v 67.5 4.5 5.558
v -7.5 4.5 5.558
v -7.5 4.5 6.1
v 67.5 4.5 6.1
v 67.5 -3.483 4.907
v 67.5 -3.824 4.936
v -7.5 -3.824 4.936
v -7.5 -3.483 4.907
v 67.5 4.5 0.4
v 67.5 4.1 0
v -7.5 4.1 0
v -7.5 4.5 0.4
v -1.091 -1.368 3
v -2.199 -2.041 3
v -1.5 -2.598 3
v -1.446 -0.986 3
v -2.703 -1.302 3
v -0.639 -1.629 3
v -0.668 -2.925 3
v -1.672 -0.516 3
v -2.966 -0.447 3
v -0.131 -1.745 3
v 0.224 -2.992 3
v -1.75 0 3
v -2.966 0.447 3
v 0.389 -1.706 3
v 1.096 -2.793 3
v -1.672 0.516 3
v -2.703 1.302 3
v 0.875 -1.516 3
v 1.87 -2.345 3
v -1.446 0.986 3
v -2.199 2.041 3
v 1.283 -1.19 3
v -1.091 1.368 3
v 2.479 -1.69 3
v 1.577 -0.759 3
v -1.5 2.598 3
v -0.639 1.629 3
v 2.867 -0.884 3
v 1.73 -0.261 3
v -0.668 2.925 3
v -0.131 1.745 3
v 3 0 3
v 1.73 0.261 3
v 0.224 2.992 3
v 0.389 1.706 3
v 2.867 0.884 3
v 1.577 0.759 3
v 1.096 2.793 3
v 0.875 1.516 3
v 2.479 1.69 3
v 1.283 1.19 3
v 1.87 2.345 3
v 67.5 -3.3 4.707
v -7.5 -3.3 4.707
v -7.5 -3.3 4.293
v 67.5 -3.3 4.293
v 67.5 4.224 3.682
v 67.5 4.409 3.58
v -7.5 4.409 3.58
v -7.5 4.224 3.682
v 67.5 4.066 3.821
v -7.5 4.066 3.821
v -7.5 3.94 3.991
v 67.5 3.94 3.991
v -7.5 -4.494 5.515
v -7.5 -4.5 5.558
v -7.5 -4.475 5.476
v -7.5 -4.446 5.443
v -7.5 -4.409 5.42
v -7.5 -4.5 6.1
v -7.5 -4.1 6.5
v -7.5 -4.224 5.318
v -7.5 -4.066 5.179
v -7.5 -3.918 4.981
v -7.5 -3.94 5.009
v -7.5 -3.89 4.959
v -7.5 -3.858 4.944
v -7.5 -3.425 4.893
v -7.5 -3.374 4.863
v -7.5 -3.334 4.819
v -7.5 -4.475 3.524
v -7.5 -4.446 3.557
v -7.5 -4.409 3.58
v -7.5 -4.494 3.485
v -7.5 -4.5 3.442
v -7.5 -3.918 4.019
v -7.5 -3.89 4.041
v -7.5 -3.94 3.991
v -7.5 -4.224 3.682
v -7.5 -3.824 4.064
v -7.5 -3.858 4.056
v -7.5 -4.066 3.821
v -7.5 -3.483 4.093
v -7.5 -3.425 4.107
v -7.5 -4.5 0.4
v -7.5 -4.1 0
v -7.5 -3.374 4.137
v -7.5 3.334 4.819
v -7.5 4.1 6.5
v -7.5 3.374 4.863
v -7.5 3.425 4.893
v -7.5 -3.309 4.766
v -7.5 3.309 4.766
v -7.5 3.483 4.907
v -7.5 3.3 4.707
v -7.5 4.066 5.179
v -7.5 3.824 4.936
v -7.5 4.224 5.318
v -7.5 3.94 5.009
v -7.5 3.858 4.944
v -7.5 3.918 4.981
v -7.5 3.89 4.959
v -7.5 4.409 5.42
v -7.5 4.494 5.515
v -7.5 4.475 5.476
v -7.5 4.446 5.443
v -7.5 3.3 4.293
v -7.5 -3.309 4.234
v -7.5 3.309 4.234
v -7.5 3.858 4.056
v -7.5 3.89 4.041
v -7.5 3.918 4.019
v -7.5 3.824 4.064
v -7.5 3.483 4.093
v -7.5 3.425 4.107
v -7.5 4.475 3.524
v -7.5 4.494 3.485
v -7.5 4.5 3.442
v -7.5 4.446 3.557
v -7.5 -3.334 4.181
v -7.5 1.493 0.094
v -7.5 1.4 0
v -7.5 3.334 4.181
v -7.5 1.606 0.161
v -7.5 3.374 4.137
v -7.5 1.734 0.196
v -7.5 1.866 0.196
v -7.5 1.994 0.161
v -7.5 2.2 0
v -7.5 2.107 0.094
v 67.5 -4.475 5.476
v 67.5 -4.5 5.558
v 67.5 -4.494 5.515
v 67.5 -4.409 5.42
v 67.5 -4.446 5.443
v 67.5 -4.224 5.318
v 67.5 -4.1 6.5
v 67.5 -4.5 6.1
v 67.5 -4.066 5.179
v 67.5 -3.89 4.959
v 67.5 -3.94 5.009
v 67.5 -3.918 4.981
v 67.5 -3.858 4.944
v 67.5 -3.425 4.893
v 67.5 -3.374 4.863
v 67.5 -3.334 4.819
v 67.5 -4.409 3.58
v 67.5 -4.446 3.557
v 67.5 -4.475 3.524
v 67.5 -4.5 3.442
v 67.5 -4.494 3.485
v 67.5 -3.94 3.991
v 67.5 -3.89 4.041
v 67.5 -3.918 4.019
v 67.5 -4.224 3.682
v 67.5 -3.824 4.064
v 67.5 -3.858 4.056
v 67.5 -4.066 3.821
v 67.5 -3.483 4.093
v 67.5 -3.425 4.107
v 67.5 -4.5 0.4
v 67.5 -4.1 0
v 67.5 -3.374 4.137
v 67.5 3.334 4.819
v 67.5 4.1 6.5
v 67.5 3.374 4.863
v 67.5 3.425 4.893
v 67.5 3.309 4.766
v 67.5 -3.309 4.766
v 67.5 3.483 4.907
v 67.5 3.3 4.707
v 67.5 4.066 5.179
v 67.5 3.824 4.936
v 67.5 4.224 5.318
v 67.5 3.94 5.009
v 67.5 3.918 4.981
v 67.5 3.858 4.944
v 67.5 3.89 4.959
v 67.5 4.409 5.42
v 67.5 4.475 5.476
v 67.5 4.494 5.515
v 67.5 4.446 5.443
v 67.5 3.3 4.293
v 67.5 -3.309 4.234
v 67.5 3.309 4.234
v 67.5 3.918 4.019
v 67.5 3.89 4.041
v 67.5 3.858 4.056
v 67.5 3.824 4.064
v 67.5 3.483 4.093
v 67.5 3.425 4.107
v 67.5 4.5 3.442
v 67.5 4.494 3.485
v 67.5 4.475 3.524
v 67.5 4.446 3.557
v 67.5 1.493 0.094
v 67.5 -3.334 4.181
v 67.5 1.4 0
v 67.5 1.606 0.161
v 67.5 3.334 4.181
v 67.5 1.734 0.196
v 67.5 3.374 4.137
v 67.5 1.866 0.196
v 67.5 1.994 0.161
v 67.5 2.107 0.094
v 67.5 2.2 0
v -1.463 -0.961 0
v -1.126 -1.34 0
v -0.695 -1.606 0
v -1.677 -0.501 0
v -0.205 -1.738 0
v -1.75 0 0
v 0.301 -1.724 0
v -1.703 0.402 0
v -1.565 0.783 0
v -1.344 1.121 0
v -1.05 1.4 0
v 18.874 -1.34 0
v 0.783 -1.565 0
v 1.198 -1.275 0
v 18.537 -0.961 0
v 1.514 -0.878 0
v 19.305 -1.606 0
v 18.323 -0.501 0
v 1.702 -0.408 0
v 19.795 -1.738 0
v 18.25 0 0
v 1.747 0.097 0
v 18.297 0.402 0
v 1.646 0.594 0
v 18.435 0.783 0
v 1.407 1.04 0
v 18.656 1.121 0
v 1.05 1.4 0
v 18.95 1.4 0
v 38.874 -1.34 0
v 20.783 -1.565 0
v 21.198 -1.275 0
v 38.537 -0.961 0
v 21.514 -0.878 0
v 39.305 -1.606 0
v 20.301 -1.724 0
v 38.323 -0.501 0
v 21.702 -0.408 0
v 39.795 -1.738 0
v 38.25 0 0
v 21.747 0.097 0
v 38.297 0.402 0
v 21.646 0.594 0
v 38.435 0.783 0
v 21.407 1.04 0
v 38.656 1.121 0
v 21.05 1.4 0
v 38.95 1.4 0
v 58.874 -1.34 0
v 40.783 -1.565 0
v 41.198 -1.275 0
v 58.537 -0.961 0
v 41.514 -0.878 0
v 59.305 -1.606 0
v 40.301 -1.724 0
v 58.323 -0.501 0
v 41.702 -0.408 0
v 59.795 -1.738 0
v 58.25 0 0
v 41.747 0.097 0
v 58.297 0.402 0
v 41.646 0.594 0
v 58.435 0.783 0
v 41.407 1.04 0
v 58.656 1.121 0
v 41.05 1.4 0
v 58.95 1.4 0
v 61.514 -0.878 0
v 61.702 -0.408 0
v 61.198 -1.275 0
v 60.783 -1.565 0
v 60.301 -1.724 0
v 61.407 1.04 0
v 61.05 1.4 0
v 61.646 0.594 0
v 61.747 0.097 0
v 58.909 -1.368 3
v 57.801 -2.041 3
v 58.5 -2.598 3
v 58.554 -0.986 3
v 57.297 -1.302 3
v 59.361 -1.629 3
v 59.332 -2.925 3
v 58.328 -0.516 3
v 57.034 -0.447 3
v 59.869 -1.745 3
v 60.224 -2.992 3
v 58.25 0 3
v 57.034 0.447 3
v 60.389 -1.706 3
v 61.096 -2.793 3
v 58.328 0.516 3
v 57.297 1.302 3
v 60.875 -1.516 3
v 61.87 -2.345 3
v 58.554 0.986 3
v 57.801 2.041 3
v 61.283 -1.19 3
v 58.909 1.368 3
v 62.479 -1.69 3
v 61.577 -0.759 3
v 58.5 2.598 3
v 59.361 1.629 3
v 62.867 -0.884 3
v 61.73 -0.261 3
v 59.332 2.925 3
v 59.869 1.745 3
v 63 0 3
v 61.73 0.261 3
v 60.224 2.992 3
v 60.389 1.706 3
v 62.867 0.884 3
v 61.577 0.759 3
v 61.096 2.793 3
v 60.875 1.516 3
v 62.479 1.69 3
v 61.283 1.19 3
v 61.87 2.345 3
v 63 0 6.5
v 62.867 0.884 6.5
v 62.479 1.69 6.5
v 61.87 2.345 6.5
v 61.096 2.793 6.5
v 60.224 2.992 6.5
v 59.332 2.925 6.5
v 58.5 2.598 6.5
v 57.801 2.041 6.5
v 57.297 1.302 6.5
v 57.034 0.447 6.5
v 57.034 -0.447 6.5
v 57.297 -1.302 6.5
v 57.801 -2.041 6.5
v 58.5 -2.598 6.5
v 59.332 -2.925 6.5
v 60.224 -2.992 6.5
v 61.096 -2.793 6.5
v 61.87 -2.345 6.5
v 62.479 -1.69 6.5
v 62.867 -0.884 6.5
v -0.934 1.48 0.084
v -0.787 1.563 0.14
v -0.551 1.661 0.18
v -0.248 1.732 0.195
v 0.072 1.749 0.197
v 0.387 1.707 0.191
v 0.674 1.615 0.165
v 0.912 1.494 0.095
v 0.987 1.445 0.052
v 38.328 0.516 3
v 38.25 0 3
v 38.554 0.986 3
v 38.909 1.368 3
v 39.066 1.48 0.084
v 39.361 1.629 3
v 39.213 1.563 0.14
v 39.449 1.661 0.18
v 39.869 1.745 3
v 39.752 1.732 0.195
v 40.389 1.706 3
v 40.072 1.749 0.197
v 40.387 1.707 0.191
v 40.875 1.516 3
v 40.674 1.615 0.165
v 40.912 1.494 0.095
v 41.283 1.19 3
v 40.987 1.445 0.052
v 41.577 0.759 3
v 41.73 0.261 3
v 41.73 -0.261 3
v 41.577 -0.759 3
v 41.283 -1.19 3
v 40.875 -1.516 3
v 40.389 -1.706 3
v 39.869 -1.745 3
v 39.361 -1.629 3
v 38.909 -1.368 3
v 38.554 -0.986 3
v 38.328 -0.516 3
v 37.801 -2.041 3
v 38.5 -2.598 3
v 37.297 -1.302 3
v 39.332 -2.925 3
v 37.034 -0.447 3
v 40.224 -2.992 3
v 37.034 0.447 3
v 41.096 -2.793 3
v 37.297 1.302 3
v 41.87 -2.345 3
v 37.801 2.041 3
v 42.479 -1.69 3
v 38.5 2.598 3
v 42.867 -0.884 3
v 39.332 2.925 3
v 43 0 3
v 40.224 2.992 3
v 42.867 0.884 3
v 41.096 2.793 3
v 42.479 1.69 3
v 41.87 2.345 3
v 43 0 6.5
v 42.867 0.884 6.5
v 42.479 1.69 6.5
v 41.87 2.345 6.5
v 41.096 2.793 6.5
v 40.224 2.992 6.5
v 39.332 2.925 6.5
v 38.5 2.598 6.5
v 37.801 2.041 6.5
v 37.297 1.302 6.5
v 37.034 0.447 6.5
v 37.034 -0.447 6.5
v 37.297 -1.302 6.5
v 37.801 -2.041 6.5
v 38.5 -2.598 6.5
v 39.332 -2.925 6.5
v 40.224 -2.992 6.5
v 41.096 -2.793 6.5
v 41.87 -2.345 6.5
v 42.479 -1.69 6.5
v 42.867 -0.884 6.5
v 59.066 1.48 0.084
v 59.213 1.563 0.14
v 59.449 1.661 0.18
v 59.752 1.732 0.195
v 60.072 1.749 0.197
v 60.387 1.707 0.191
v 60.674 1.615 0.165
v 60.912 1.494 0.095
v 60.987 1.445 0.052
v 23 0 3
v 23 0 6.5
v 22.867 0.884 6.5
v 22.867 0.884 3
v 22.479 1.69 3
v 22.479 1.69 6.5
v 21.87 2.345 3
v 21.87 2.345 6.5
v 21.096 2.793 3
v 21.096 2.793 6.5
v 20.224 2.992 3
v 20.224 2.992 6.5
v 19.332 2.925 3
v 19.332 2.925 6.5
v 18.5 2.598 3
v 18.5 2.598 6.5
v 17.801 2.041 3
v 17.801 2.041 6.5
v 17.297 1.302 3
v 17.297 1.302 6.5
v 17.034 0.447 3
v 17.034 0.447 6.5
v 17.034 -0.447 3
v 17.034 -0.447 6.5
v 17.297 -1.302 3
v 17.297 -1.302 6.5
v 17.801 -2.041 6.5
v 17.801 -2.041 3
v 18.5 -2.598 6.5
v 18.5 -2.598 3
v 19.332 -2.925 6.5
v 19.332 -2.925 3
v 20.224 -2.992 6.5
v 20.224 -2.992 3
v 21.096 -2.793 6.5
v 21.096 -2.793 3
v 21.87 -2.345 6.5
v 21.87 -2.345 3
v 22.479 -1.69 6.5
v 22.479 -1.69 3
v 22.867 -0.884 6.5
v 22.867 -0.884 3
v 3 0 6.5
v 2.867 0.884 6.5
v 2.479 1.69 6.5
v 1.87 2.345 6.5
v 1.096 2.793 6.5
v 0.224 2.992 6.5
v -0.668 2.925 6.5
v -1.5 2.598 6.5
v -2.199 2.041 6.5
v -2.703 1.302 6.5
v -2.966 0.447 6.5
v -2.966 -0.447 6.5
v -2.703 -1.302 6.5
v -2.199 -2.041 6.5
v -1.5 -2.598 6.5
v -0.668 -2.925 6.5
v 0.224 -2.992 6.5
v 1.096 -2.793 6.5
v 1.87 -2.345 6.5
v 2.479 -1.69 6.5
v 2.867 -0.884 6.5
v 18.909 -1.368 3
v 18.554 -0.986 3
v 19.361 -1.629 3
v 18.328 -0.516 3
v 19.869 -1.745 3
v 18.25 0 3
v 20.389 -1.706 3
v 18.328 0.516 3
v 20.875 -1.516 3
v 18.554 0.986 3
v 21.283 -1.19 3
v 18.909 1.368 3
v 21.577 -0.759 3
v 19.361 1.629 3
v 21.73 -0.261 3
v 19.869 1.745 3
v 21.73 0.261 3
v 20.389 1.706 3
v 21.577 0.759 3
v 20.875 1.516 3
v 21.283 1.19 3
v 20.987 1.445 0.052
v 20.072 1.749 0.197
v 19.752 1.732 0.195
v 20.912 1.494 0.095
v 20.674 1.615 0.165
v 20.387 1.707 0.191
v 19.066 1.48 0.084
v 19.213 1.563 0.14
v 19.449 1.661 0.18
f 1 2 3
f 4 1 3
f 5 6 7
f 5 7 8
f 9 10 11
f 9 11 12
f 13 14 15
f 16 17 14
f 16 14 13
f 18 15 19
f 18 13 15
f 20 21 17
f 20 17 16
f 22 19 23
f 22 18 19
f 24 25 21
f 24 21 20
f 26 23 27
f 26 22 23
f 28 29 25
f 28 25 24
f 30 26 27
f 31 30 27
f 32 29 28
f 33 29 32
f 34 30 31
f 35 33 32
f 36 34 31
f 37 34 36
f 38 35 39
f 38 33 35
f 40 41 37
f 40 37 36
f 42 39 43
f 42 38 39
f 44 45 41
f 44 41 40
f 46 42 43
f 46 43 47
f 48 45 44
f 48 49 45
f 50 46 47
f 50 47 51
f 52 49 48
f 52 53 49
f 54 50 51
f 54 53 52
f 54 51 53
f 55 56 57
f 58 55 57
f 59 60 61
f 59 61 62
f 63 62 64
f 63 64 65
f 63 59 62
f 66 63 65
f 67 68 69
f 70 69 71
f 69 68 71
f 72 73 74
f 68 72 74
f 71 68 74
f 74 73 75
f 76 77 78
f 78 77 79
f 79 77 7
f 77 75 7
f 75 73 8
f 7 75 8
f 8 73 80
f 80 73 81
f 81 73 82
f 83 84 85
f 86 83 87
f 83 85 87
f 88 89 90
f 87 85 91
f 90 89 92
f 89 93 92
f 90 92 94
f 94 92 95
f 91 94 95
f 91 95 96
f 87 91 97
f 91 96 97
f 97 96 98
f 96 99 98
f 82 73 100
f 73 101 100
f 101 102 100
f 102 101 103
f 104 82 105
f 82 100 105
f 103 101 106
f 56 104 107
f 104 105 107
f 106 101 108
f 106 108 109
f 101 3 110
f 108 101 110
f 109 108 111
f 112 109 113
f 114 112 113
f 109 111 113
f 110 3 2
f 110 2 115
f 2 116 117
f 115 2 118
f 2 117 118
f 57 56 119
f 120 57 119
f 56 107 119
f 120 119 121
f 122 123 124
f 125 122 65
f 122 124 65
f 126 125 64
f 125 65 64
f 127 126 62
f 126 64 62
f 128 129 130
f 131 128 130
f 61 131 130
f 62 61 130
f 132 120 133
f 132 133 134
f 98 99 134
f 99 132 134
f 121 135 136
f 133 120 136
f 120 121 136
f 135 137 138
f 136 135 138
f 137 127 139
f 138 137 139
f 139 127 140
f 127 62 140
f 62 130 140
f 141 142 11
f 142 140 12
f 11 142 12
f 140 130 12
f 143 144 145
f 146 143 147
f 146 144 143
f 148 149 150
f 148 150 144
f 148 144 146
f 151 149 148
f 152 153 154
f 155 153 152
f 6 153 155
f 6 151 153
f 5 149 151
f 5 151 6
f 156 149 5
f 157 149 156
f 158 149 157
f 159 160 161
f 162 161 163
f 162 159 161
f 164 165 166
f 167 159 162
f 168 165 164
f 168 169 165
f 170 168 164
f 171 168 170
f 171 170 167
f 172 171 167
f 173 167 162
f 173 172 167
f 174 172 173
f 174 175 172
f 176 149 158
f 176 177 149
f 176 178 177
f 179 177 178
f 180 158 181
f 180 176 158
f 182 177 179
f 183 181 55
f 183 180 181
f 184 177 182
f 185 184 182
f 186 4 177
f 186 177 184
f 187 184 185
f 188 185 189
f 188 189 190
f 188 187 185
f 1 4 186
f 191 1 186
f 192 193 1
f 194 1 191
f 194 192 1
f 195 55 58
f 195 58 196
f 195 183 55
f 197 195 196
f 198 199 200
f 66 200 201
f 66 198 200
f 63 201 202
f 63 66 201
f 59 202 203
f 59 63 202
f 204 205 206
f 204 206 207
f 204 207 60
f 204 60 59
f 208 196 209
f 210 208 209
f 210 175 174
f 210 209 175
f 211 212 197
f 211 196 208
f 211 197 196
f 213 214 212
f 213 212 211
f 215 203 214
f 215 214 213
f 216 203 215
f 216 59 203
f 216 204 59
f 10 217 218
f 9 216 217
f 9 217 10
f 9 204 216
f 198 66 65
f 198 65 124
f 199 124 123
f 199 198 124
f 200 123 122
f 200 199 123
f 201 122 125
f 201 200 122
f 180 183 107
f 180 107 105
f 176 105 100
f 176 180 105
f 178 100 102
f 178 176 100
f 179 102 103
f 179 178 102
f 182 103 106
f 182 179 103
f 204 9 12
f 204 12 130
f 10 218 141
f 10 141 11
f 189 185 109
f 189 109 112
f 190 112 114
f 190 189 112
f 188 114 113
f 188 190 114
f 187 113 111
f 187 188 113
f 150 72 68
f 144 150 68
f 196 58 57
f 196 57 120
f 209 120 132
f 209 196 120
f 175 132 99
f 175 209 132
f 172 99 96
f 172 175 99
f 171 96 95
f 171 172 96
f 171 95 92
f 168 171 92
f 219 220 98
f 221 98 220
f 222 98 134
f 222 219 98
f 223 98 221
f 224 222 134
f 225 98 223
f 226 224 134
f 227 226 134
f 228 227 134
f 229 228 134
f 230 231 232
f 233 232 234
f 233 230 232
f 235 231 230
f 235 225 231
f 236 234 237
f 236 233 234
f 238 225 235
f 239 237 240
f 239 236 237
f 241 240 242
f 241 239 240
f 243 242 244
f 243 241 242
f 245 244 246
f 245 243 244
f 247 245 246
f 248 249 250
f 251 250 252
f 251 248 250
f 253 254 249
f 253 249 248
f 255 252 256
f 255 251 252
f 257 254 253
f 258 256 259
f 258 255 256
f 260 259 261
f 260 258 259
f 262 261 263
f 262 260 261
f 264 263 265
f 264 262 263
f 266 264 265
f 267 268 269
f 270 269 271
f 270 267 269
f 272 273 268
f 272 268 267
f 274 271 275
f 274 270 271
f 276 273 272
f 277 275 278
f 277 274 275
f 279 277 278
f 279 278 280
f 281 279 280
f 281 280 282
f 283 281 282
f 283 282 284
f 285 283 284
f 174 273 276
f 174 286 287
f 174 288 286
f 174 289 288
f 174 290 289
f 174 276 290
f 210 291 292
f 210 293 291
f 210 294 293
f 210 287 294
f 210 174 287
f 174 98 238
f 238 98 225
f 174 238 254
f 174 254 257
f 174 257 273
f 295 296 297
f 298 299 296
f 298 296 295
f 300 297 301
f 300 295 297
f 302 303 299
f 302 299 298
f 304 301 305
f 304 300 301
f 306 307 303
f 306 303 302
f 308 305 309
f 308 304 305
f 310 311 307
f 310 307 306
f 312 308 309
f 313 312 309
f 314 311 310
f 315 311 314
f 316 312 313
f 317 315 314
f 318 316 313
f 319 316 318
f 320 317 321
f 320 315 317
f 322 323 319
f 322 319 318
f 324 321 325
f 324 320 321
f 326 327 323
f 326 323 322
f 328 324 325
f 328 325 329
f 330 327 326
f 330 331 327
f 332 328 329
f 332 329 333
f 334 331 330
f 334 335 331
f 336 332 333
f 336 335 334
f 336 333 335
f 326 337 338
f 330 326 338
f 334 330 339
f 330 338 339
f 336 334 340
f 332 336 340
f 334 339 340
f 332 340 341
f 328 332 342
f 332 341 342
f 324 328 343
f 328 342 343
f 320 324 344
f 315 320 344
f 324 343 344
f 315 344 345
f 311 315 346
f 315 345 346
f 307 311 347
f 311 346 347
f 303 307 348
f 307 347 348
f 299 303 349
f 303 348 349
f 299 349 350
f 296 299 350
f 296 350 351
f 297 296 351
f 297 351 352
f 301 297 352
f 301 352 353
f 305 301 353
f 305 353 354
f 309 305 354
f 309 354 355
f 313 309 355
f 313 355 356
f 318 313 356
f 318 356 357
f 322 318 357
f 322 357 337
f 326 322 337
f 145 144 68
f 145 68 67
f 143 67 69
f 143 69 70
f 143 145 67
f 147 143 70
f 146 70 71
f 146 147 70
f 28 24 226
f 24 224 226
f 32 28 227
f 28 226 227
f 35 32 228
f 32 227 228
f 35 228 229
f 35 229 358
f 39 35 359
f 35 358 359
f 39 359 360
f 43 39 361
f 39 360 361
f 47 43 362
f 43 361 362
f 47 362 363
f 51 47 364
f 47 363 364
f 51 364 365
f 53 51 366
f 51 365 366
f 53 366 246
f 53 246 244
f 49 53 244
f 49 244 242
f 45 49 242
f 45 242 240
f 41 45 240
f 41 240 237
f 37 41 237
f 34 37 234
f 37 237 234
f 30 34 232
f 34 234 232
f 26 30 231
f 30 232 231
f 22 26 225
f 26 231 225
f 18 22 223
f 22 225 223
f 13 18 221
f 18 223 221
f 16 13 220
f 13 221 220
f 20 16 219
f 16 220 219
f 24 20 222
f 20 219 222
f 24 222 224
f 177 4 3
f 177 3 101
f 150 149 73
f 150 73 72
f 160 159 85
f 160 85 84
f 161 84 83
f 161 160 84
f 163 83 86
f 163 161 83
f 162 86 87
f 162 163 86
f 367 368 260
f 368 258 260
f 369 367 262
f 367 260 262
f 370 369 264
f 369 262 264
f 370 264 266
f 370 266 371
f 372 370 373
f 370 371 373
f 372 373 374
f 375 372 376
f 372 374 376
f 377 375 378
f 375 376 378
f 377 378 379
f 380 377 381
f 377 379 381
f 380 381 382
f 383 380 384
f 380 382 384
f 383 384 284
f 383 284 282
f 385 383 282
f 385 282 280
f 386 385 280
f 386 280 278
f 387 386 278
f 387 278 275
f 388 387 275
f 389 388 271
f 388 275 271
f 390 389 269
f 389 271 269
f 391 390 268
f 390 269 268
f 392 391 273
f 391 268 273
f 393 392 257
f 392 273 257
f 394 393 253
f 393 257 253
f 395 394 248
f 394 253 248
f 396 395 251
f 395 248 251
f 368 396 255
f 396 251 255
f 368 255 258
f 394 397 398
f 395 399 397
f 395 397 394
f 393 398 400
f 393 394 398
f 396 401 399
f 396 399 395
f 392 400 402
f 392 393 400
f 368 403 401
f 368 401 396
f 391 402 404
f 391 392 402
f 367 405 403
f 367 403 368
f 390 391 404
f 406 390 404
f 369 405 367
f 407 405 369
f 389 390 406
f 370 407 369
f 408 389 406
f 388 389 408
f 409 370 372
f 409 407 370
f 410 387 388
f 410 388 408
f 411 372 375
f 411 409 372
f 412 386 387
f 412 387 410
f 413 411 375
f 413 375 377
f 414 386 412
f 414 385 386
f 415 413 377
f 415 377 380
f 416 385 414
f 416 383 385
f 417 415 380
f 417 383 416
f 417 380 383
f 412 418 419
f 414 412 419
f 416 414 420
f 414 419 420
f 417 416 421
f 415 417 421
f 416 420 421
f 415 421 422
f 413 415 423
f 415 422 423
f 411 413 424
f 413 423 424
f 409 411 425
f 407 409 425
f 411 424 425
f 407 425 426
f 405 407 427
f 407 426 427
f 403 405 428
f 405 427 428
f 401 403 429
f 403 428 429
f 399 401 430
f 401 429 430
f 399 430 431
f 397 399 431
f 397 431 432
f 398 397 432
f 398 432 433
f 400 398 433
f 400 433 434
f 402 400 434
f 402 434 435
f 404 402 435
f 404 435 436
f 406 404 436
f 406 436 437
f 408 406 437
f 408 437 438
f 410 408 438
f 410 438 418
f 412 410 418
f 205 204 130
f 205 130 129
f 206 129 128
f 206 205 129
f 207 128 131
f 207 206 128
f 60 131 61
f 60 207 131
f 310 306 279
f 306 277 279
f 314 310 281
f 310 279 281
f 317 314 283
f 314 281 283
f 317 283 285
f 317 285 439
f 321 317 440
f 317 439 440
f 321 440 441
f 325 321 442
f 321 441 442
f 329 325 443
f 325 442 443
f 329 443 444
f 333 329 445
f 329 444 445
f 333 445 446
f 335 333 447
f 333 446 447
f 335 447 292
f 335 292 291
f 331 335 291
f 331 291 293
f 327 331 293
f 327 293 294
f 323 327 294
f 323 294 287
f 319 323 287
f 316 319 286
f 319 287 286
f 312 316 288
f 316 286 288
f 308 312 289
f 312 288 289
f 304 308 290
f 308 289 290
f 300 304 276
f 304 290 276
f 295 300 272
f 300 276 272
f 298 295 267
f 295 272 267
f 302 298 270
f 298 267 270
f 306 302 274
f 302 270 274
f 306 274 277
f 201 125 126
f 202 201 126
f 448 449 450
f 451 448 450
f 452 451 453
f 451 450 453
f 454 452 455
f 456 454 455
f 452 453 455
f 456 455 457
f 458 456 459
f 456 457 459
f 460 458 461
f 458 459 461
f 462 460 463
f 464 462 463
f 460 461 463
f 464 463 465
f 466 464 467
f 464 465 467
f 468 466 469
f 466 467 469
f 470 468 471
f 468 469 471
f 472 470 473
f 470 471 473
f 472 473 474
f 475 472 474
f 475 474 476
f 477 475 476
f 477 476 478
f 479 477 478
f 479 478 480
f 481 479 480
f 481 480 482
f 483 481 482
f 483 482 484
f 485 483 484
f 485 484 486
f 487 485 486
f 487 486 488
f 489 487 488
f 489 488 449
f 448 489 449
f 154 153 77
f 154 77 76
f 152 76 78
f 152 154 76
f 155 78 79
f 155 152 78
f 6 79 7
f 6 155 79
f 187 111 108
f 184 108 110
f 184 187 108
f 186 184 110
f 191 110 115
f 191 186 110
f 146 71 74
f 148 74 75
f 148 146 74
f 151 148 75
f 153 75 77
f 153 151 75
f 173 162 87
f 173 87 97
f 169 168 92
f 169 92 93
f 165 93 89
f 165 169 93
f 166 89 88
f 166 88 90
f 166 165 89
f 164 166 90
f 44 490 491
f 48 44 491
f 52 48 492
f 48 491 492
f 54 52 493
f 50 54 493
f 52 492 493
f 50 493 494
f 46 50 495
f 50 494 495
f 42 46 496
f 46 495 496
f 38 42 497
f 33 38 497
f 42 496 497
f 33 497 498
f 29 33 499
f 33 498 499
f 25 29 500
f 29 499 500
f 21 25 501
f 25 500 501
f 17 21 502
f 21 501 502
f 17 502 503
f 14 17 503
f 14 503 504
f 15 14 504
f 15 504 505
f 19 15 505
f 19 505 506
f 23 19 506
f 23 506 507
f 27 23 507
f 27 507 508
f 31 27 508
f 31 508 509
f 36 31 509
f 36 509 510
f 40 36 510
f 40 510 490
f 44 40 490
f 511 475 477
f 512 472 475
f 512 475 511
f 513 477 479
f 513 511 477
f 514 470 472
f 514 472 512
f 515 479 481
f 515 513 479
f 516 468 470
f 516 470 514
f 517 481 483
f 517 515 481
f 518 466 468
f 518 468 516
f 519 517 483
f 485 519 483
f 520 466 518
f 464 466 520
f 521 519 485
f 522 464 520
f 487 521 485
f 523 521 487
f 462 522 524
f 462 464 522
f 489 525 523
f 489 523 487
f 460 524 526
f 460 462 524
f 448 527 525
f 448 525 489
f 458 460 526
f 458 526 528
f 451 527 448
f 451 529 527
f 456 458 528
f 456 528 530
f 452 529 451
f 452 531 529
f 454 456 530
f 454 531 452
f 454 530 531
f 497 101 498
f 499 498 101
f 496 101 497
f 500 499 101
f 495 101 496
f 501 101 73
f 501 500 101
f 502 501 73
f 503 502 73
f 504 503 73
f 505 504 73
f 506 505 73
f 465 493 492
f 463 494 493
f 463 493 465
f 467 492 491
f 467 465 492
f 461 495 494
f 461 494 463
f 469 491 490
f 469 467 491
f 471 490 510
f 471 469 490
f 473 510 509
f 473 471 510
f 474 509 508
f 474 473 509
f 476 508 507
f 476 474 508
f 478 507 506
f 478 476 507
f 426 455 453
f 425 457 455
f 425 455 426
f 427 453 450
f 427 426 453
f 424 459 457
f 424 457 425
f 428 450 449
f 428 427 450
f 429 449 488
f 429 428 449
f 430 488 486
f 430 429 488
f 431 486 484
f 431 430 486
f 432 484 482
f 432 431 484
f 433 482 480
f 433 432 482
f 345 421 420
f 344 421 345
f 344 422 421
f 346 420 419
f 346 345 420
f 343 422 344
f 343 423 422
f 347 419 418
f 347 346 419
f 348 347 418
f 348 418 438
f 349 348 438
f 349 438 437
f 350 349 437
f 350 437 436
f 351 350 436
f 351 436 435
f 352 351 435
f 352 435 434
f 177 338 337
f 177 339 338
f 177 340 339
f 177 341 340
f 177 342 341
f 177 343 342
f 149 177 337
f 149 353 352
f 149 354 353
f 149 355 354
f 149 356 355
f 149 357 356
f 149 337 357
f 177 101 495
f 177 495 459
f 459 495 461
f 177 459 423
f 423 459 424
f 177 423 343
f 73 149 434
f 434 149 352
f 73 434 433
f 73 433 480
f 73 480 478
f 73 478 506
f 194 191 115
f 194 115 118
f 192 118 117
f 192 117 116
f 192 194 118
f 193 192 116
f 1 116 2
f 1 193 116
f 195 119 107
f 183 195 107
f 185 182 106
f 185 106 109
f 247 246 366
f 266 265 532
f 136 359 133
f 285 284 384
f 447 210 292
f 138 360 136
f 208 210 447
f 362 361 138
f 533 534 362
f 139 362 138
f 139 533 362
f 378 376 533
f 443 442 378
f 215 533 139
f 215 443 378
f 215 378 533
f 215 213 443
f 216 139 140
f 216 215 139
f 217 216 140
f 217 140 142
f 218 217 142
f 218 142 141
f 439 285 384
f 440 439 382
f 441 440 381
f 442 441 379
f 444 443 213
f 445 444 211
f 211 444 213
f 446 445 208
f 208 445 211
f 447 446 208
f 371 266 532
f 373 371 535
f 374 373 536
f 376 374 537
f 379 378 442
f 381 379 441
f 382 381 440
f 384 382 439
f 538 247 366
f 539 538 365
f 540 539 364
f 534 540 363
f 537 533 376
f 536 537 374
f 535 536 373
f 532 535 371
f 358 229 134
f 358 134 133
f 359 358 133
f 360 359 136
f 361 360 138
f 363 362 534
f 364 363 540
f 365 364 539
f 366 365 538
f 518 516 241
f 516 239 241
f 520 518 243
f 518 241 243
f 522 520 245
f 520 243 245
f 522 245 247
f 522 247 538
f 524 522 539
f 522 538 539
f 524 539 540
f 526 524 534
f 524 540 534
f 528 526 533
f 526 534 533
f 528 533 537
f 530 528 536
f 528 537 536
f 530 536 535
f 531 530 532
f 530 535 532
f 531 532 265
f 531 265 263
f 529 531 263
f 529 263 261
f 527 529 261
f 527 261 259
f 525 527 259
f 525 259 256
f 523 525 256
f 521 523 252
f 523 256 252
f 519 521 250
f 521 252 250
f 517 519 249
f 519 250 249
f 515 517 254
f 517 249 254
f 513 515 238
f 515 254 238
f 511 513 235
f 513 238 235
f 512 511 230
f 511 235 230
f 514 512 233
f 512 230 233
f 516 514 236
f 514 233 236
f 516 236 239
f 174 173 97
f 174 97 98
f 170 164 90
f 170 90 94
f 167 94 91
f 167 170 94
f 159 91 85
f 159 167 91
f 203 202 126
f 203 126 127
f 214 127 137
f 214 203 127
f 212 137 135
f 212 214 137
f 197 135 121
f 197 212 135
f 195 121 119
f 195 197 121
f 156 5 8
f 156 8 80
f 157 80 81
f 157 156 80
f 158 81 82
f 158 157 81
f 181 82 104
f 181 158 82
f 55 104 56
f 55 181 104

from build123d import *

# Parameters (mm, degrees)
BOSS_EXTRUDE1_DEPTH                              = 75
CBORE_FOR_M3_HEX_HEAD_MACHINE_SCREW2_D           = 3.5
CBORE_FOR_M3_HEX_HEAD_MACHINE_SCREW2_DEPTH       = 6.5
CBORE_FOR_M3_HEX_HEAD_MACHINE_SCREW2_CBORE_D     = 6
CBORE_FOR_M3_HEX_HEAD_MACHINE_SCREW2_CBORE_DEPTH = 3.5
LPATTERN2_COUNT                                  = 4
LPATTERN2_PITCH                                  = 20


with BuildPart() as part:
    # Sketch1 → Boss-Extrude1 (new body)
    with BuildSketch(Plane(origin=(67.5, 0, 0), x_dir=(0, 0, -1), z_dir=(1, 0, 0))):
        with BuildLine():
            Line((-3.441696476, -4.5), (-0.4, -4.5))
            Line((-0.4, -4.5), (0, -4.1))
            Line((0, -4.1), (0, 1.4))
            ThreePointArc((0, 1.4), (-0.2, 1.8), (0, 2.2))
            Line((0, 2.2), (0, 4.1))
            Line((0, 4.1), (-0.4, 4.5))
            Line((-0.4, 4.5), (-3.441696476, 4.5))
            ThreePointArc((-3.441696476, 4.5), (-3.524448068, 4.475108648), (-3.579735674, 4.408695652))
            ThreePointArc((-3.579735674, 4.408695652), (-3.747623907, 4.141262777), (-3.990528855, 3.939510483))
            ThreePointArc((-3.990528855, 3.939510483), (-4.041057421, 3.890337026), (-4.063537838, 3.823510417))
            Line((-4.063537838, 3.823510417), (-4.09336636, 3.482568852))
            ThreePointArc((-4.09336636, 3.482568852), (-4.157487258, 3.352544533), (-4.292605299, 3.3))
            Line((-4.292605299, 3.3), (-4.707394701, 3.3))
            ThreePointArc((-4.707394701, 3.3), (-4.842512742, 3.352544533), (-4.90663364, 3.482568852))
            Line((-4.90663364, 3.482568852), (-4.93646249, 3.823514163))
            ThreePointArc((-4.93646249, 3.823514163), (-4.958942652, 3.890340367), (-5.009470648, 3.939513741))
            ThreePointArc((-5.009470648, 3.939513741), (-5.252372199, 4.141265182), (-5.420258326, 4.408695652))
            ThreePointArc((-5.420258326, 4.408695652), (-5.475545932, 4.475108648), (-5.558297524, 4.5))
            Line((-5.558297524, 4.5), (-6.1, 4.5))
            Line((-6.1, 4.5), (-6.5, 4.1))
            Line((-6.5, 4.1), (-6.5, -4.1))
            Line((-6.5, -4.1), (-6.1, -4.5))
            Line((-6.1, -4.5), (-5.558297524, -4.5))
            ThreePointArc((-5.558297524, -4.5), (-5.475545932, -4.475108648), (-5.420258326, -4.408695652))
            ThreePointArc((-5.420258326, -4.408695652), (-5.252372199, -4.141265182), (-5.009470648, -3.939513741))
            ThreePointArc((-5.009470648, -3.939513741), (-4.958942652, -3.890340367), (-4.93646249, -3.823514163))
            Line((-4.93646249, -3.823514163), (-4.90663364, -3.482568852))
            ThreePointArc((-4.90663364, -3.482568852), (-4.842512742, -3.352544533), (-4.707394701, -3.3))
            Line((-4.707394701, -3.3), (-4.292605299, -3.3))
            ThreePointArc((-4.292605299, -3.3), (-4.157487258, -3.352544533), (-4.09336636, -3.482568852))
            Line((-4.09336636, -3.482568852), (-4.063537838, -3.823510417))
            ThreePointArc((-4.063537838, -3.823510417), (-4.041057421, -3.890337026), (-3.990528855, -3.939510483))
            ThreePointArc((-3.990528855, -3.939510483), (-3.747623907, -4.141262777), (-3.579735674, -4.408695652))
            ThreePointArc((-3.579735674, -4.408695652), (-3.524448068, -4.475108648), (-3.441696476, -4.5))
        make_face()
    extrude(amount=-BOSS_EXTRUDE1_DEPTH)

    # CBORE for M3 Hex Head Machine Screw2
    with Locations(Plane.XY.offset(6.5)):
        with Locations((0, 0)):
            cbore_for_m3_hex_head_machine_screw2 = CounterBoreHole(CBORE_FOR_M3_HEX_HEAD_MACHINE_SCREW2_D / 2, CBORE_FOR_M3_HEX_HEAD_MACHINE_SCREW2_CBORE_D / 2, CBORE_FOR_M3_HEX_HEAD_MACHINE_SCREW2_CBORE_DEPTH, depth=CBORE_FOR_M3_HEX_HEAD_MACHINE_SCREW2_DEPTH)

    # LPattern2: CBORE for M3 Hex Head Machine Screw2 ×4
    with Locations(*[(i * LPATTERN2_PITCH, 0, 0) for i in range(1, LPATTERN2_COUNT)]):
        add(cbore_for_m3_hex_head_machine_screw2, mode=Mode.SUBTRACT)


solid = part.part
